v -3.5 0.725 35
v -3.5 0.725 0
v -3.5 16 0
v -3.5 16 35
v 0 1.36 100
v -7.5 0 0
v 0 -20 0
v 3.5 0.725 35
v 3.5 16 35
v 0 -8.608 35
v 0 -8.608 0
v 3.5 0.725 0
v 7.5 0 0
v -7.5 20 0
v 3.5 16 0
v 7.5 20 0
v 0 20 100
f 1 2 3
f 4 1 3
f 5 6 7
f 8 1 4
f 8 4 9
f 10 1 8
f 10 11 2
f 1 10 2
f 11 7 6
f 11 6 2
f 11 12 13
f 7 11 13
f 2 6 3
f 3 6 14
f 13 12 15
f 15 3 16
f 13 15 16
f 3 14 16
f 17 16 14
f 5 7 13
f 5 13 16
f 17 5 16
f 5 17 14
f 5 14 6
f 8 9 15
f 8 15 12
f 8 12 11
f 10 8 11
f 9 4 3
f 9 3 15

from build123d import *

# Parameters (mm, degrees)
F1_DEPTH = 100
F3_DEPTH = 35
F4_SIZE2 = 99.99999
F4_SIZE  = 7.49999


# Not quite as in the source:
# - a fillet or chamfer is up to 0.001 mm smaller than in the source, because OpenCascade refuses the exact size


with BuildPart() as f1:
    # F0 (on Top) → F1 (new body)
    with BuildSketch(Plane.XY):
        Polygon((-7.5, 20), (-7.5, 0), (0, -20), (7.5, 0), (7.5, 20), align=None)
    extrude(amount=F1_DEPTH)

    # F2 (on face) → F3 (cut)
    with BuildSketch(Plane(origin=(0, 0, 0), x_dir=(1, 0, 0), z_dir=(0, 0, -1))):
        Polygon((0, 8.6079950062), (-3.5, -0.7253383271), (-3.5, -16), (3.5, -16), (3.5, -0.7253383271), align=None)
    extrude(amount=-F3_DEPTH, mode=Mode.SUBTRACT)

    # F4 (size 7.5 and 100 in the source; OpenCascade refuses exactly that, so slightly less here)
    f4_edges = [f1.edges().sort_by_distance(p)[0] for p in [
        (3.75, -10, 100),
        (-3.75, -10, 100),
        (7.5, 10, 100),
        (-7.5, 10, 100),
    ]]
    f4_side = f1.faces().sort_by_distance((0, 4.444444, 100))[0]
    chamfer(f4_edges, length=F4_SIZE, length2=F4_SIZE2, reference=f4_side)


solid = f1.part
